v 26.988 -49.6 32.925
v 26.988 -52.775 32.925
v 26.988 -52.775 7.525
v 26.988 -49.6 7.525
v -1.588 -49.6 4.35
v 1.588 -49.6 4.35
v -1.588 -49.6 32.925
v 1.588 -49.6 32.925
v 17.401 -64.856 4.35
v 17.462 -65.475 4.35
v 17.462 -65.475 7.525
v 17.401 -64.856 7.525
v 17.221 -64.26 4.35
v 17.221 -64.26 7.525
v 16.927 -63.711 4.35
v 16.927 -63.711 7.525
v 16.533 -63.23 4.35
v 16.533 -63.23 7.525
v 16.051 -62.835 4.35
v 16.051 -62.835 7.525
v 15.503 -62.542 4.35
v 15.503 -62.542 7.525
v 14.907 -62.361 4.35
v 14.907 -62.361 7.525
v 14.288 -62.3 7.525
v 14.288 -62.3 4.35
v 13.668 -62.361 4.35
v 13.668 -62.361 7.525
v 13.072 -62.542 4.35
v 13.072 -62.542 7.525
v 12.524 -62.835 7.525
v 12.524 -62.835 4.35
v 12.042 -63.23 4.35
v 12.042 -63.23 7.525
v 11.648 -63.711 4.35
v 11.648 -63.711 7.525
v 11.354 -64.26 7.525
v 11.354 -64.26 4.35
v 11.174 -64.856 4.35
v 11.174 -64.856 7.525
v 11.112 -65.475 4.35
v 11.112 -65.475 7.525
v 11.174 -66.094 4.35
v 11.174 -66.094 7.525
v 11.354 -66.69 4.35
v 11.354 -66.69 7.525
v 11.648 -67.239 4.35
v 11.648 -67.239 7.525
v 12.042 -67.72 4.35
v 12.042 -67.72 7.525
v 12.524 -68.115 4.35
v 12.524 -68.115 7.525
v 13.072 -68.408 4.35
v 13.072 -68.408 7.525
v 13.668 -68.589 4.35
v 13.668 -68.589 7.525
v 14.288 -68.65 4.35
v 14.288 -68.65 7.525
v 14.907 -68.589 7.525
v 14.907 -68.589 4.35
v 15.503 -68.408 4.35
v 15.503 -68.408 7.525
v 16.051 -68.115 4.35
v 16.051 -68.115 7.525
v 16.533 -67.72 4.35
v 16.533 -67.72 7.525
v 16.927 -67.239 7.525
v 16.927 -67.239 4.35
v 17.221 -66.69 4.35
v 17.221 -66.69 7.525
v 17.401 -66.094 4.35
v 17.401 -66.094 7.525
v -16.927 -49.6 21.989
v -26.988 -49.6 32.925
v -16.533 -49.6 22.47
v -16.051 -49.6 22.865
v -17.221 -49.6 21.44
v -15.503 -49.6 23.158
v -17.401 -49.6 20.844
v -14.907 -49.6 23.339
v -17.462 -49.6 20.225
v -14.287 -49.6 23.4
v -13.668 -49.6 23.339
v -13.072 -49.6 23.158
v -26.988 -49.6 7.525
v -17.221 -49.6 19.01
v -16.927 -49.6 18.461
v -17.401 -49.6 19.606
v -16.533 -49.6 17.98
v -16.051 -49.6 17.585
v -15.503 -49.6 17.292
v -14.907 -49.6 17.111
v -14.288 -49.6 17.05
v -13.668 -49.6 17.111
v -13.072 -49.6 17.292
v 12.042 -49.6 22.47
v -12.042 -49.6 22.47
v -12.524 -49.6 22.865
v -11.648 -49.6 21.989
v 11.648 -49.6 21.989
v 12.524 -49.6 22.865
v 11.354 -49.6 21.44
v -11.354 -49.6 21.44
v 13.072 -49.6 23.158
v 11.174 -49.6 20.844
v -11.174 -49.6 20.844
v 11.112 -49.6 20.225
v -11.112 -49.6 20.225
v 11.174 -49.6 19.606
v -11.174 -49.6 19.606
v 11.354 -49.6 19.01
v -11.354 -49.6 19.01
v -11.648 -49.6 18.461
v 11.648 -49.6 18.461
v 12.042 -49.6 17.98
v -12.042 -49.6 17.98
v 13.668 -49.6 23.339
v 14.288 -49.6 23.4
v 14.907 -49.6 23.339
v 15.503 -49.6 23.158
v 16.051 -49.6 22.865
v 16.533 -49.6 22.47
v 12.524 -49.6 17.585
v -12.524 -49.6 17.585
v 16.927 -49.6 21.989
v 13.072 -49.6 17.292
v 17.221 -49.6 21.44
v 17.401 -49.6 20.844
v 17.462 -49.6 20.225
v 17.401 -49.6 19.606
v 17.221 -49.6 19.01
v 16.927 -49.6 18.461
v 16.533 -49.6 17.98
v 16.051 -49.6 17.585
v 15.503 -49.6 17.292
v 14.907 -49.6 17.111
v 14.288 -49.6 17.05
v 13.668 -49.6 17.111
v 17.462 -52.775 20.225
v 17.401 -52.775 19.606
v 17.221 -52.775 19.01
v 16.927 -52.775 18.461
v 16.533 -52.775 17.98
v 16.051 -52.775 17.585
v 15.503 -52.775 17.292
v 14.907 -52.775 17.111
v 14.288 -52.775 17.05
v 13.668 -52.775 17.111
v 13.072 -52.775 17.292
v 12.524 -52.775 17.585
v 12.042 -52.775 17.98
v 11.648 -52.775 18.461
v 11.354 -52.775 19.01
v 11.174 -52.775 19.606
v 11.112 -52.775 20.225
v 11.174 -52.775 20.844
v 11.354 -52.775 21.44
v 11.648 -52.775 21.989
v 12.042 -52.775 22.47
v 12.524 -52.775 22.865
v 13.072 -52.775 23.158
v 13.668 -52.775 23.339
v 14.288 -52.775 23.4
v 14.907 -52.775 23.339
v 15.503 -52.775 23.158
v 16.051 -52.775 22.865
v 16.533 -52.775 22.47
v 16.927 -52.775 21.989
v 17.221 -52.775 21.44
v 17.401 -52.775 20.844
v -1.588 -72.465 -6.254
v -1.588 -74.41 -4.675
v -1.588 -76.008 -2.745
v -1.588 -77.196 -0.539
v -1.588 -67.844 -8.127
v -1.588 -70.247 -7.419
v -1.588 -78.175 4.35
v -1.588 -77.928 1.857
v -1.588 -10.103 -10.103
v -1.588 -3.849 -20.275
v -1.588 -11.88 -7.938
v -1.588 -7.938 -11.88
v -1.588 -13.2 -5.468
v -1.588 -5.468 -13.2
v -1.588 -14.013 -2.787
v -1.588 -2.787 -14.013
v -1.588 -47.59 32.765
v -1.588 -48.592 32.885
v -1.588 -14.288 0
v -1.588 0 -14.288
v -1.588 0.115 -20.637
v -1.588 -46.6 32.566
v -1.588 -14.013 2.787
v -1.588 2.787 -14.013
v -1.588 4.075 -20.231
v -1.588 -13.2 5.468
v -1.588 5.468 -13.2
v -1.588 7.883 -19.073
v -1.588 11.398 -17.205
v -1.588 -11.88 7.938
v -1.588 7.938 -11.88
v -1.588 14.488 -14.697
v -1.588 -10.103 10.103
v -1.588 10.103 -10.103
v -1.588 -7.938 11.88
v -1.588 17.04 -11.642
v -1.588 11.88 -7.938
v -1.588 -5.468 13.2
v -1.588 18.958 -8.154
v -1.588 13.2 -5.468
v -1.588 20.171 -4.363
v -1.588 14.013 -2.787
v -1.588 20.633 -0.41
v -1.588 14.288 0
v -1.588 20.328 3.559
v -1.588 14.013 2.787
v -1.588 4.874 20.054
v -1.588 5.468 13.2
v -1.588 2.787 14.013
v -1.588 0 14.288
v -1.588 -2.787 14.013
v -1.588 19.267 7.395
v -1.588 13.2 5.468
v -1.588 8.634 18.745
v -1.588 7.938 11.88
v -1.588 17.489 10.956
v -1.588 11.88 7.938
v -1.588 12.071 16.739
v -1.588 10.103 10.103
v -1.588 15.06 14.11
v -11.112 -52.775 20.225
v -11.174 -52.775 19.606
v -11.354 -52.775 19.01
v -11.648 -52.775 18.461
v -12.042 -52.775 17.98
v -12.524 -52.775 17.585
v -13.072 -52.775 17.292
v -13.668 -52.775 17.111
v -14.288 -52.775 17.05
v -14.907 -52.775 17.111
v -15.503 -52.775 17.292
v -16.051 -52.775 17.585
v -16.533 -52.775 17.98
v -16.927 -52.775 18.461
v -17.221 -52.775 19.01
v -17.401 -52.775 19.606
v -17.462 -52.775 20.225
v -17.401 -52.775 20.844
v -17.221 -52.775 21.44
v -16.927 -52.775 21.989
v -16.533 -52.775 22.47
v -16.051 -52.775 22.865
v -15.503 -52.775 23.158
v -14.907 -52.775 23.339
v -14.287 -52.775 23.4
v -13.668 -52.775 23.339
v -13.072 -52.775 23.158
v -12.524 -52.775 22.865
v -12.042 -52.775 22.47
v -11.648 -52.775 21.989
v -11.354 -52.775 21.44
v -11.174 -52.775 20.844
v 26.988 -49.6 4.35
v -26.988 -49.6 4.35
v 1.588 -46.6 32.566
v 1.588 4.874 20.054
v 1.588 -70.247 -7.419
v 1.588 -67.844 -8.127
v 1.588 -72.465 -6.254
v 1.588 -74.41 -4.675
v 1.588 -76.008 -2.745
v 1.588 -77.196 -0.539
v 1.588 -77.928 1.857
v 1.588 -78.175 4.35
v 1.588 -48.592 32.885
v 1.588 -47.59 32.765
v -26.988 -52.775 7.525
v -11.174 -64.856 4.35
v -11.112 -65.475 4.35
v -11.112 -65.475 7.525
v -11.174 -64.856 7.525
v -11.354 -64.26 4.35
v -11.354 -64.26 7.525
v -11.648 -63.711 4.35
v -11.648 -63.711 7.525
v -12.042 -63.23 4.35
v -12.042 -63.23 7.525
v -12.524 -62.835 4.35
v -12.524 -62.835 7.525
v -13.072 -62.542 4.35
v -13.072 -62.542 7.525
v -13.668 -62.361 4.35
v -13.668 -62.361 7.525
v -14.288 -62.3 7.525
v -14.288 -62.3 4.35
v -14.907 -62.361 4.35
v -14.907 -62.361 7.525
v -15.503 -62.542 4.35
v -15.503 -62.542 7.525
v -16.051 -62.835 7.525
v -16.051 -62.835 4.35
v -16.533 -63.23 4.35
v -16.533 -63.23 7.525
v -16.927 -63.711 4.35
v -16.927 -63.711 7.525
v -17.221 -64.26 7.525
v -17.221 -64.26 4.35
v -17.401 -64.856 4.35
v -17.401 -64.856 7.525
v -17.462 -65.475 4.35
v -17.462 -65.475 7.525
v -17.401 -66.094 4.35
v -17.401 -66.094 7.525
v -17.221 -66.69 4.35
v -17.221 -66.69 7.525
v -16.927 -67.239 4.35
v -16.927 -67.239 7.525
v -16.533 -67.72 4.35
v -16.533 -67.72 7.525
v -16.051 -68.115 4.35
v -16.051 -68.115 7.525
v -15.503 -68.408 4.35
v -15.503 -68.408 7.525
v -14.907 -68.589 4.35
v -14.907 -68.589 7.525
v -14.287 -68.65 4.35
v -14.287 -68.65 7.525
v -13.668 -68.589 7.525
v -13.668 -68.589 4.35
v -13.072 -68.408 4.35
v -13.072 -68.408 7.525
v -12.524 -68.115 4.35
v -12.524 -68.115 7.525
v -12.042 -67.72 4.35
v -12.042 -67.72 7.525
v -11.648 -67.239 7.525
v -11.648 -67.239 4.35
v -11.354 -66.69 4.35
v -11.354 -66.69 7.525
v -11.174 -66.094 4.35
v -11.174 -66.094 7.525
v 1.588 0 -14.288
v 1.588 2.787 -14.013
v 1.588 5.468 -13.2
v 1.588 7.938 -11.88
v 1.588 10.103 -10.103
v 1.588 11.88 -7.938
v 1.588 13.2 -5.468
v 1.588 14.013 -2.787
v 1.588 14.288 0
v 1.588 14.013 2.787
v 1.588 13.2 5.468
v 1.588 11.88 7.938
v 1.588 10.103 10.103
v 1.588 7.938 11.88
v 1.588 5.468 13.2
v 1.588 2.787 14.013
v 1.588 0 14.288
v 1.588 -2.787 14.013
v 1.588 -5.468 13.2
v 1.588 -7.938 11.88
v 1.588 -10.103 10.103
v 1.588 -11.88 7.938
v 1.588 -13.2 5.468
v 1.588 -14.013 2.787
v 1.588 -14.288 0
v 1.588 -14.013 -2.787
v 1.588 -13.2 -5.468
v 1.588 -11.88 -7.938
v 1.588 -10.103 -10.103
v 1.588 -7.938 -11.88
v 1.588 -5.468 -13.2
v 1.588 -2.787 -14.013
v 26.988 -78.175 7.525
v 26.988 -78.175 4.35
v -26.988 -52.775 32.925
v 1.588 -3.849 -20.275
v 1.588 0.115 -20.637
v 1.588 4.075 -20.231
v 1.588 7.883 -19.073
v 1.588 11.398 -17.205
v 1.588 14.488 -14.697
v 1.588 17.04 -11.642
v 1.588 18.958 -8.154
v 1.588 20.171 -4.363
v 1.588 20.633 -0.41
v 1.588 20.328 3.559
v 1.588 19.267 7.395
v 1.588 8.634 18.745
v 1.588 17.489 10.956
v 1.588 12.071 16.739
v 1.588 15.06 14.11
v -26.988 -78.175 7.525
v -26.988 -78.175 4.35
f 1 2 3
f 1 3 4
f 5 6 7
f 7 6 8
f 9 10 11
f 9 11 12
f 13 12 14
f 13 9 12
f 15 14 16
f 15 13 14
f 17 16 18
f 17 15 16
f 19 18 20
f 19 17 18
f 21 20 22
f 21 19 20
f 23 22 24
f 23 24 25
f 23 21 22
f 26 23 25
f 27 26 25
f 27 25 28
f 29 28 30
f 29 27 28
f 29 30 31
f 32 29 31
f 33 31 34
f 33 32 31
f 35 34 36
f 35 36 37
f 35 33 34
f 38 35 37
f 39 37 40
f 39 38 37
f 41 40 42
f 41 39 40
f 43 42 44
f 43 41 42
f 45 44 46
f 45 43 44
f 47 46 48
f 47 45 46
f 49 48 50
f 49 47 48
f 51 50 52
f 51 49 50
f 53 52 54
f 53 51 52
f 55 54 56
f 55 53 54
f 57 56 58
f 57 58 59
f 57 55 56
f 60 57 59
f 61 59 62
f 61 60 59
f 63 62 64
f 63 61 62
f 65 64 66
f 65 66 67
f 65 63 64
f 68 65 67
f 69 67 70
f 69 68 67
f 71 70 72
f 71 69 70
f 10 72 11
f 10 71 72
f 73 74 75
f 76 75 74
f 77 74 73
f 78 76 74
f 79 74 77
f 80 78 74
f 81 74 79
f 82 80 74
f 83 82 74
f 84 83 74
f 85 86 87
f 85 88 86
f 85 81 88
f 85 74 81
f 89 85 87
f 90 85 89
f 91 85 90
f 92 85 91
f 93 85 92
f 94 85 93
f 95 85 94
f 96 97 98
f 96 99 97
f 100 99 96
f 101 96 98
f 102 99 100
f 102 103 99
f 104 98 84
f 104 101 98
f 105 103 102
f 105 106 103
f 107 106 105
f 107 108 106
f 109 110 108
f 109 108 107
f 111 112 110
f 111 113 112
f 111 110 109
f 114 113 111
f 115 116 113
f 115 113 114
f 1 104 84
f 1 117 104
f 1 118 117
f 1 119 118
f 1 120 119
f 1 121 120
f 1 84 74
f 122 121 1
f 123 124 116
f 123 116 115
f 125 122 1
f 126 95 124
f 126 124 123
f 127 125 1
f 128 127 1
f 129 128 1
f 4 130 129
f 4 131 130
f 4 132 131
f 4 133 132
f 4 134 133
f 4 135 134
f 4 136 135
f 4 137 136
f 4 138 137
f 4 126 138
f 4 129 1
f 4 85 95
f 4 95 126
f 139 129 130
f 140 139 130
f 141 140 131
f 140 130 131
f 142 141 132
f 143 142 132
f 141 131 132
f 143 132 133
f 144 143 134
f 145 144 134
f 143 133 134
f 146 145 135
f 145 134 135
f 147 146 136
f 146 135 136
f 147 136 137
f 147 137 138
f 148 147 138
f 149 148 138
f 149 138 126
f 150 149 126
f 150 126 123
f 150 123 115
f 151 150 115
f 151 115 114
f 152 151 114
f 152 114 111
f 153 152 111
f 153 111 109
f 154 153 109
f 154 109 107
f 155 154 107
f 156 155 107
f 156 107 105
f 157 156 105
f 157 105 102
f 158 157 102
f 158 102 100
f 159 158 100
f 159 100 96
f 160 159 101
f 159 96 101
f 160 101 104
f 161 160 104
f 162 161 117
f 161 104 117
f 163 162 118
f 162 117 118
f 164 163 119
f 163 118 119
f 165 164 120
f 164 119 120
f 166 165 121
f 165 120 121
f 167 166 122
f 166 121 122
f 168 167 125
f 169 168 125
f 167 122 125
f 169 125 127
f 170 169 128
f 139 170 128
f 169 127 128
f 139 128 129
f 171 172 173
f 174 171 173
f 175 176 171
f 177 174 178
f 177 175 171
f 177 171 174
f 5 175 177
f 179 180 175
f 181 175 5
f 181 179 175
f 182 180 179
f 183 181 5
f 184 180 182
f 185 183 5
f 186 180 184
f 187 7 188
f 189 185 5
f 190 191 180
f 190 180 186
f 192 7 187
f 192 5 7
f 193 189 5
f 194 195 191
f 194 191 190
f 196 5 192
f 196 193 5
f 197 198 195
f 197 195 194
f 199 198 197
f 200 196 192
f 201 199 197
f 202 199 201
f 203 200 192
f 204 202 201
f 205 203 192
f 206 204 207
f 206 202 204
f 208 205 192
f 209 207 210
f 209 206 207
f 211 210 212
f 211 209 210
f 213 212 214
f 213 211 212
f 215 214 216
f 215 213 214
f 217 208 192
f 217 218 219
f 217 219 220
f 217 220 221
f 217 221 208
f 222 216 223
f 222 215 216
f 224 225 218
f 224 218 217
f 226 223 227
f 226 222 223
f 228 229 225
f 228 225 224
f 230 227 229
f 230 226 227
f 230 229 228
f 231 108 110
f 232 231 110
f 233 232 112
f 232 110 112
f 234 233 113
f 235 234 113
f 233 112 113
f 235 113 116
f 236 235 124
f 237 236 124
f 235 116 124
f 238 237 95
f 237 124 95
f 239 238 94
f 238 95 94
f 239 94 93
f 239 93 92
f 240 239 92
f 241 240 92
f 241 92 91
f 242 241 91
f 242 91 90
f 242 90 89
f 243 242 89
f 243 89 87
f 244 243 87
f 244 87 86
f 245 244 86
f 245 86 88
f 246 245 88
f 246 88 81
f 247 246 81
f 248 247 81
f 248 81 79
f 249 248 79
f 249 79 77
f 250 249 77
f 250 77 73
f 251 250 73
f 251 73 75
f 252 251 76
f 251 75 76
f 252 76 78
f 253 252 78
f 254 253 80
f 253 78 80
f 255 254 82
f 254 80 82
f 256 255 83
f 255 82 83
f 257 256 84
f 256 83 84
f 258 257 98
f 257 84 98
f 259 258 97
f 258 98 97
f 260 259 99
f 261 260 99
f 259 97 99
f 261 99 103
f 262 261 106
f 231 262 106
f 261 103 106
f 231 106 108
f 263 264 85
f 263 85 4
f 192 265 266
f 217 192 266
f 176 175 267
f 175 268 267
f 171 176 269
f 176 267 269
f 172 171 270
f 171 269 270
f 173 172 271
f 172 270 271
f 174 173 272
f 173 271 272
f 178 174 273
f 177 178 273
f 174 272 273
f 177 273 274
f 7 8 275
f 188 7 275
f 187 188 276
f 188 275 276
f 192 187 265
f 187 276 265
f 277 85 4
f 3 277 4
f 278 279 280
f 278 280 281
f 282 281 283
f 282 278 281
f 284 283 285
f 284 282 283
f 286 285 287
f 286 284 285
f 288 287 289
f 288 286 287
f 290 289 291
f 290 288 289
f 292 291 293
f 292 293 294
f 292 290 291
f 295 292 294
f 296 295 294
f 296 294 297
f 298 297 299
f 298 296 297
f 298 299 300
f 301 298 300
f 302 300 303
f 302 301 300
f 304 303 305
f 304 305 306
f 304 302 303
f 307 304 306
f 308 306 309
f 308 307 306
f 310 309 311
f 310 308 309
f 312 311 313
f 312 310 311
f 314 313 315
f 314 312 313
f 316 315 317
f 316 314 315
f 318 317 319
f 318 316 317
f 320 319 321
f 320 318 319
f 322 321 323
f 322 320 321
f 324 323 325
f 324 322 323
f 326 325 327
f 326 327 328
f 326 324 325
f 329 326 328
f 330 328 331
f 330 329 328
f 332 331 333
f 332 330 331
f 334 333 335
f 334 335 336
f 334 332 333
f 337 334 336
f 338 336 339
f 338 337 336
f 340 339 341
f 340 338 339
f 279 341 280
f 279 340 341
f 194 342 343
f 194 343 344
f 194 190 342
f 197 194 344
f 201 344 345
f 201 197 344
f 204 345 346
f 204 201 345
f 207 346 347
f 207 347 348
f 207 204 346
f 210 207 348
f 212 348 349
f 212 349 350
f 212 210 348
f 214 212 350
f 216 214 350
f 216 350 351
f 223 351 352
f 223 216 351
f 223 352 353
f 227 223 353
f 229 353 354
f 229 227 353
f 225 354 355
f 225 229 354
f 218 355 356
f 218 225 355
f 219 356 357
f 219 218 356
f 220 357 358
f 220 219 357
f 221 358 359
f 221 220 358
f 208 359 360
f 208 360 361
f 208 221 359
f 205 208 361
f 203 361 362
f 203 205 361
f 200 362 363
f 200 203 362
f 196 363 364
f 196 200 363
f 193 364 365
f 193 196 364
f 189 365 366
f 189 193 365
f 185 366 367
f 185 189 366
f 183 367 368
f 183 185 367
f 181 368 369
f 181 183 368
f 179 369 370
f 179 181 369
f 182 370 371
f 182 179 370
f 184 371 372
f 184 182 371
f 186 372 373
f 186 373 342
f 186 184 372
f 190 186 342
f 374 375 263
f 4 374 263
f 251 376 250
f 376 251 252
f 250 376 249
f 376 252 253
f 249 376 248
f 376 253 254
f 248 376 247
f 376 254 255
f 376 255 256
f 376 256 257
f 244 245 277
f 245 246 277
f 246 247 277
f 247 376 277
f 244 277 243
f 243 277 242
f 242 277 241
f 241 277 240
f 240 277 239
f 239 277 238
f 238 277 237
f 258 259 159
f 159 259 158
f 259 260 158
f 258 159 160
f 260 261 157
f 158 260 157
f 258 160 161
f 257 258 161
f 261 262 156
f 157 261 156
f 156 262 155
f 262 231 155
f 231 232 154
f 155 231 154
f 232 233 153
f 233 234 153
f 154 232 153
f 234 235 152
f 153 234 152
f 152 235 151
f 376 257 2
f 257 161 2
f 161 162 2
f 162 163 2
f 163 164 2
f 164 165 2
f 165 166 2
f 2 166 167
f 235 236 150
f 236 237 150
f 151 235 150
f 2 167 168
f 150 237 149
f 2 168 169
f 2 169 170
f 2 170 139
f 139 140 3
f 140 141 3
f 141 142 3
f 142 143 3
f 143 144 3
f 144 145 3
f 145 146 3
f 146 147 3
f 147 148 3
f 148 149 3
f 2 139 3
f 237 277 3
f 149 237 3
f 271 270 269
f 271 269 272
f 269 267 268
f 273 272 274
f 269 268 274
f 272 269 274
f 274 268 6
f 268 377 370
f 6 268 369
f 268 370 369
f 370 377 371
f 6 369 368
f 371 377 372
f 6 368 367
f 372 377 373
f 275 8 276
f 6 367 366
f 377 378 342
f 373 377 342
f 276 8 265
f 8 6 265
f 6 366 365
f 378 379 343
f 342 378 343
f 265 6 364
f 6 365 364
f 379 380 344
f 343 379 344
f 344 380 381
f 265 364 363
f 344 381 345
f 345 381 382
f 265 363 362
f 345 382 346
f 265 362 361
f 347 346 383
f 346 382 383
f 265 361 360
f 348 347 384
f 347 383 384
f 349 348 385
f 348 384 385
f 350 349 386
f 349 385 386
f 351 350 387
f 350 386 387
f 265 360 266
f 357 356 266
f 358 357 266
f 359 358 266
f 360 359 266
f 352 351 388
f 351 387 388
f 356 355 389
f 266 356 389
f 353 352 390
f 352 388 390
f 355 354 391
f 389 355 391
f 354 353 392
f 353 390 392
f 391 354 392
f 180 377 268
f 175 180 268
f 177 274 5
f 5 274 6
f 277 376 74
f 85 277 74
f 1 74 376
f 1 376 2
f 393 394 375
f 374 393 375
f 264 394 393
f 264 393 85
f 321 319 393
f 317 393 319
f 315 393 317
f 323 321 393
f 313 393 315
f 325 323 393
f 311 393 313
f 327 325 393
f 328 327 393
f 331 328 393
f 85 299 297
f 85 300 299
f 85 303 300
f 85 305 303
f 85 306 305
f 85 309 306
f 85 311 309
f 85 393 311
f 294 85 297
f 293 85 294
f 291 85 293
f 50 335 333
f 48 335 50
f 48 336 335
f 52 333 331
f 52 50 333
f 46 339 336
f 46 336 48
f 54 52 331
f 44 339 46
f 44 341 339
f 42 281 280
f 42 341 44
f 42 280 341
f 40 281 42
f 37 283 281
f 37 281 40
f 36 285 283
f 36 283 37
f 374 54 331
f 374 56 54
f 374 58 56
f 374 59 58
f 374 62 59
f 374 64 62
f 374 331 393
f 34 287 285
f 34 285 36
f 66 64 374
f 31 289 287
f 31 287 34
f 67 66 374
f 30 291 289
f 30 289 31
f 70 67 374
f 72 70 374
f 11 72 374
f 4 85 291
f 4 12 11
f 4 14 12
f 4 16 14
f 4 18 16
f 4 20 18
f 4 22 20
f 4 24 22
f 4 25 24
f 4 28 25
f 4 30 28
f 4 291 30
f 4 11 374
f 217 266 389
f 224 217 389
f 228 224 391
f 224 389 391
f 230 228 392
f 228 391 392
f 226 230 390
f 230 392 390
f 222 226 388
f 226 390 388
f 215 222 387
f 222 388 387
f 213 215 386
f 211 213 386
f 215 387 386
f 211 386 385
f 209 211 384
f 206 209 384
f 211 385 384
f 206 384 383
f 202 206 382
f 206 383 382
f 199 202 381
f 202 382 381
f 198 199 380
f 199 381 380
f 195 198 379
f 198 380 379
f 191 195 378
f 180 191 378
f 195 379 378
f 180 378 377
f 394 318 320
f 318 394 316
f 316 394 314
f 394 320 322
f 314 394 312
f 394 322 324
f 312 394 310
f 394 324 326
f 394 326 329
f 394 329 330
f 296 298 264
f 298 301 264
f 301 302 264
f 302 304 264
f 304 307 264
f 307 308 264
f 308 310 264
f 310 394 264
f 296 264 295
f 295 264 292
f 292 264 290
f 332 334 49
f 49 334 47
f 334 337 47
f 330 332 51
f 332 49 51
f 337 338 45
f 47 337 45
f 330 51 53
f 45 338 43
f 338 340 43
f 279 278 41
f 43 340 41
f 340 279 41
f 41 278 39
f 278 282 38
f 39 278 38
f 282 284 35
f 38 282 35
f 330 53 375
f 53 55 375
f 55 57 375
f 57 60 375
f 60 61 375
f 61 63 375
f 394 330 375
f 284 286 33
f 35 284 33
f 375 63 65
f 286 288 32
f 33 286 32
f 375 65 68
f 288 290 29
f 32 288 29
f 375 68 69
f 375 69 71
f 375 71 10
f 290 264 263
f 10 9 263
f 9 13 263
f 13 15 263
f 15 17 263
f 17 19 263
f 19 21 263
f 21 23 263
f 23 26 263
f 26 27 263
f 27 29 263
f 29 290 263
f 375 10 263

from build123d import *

# Parameters (mm, degrees)
SKETCH1_R           = 14.2875
BOSS_EXTRUDE1_DEPTH = 1.5875
SKETCH2_W           = 53.975
SKETCH2_H           = 28.575
SKETCH2_R           = 3.175
BOSS_EXTRUDE2_DEPTH = 3.175
SKETCH3_W           = 53.975
SKETCH3_H           = 3.175
BOSS_EXTRUDE3_DEPTH = 25.4
SKETCH4_R           = 3.175
CUT_EXTRUDE1_DEPTH  = 29.575


with BuildPart() as part:
    # Sketch1 → Boss-Extrude1 (new body, symmetric)
    with BuildSketch(Plane(origin=(0, 0, 0), x_dir=(0, 0, -1), z_dir=(1, 0, 0))):
        with BuildLine():
            Line((20.275408842, -3.848922256), (8.127174672, -67.843567542))
            ThreePointArc((8.127174672, -67.843567542), (3.74966642, -75.256891632), (-4.35, -78.175))
            Line((-4.35, -78.175), (-4.35, -49.6))
            Line((-4.35, -49.6), (-32.925, -49.6))
            ThreePointArc((-32.925, -49.6), (-32.834845882, -48.08944155), (-32.565663491, -46.600329252))
            Line((-32.565663491, -46.600329252), (-20.053578173, 4.874464966))
            ThreePointArc((-20.053578173, 4.874464966), (4.363103639, 20.171012193), (20.275408842, -3.848922256))
        make_face()
        Circle(SKETCH1_R, mode=Mode.SUBTRACT)
    extrude(amount=BOSS_EXTRUDE1_DEPTH, both=True)


with BuildPart() as body_2:
    # Sketch2 → Boss-Extrude2 (new body)
    with BuildSketch(Plane.XY.offset(4.35)):
        with Locations((0, -63.8875)):
            Rectangle(SKETCH2_W, SKETCH2_H)
        with Locations((-14.2875, -65.475)):
            Circle(SKETCH2_R, mode=Mode.SUBTRACT)
        with Locations((14.2875, -65.475)):
            Circle(SKETCH2_R, mode=Mode.SUBTRACT)
    extrude(amount=BOSS_EXTRUDE2_DEPTH)


with BuildPart() as body_3:
    # Sketch3 → Boss-Extrude3 (new body)
    with BuildSketch(Plane.XY.offset(7.525)):
        with Locations((0, -51.1875)):
            Rectangle(SKETCH3_W, SKETCH3_H)
    extrude(amount=BOSS_EXTRUDE3_DEPTH)

    # Sketch4 → Cut-Extrude1 (cut, through all)
    with BuildSketch(Plane(origin=(0, -49.6, 0), x_dir=(1, 0, 0), z_dir=(0, 1, 0))):
        with Locations((-14.2875, -20.225)):
            Circle(SKETCH4_R)
        with Locations((14.2875, -20.225)):
            Circle(SKETCH4_R)
    extrude(amount=-CUT_EXTRUDE1_DEPTH, mode=Mode.SUBTRACT)


solid = Compound([part.part, body_2.part, body_3.part])
